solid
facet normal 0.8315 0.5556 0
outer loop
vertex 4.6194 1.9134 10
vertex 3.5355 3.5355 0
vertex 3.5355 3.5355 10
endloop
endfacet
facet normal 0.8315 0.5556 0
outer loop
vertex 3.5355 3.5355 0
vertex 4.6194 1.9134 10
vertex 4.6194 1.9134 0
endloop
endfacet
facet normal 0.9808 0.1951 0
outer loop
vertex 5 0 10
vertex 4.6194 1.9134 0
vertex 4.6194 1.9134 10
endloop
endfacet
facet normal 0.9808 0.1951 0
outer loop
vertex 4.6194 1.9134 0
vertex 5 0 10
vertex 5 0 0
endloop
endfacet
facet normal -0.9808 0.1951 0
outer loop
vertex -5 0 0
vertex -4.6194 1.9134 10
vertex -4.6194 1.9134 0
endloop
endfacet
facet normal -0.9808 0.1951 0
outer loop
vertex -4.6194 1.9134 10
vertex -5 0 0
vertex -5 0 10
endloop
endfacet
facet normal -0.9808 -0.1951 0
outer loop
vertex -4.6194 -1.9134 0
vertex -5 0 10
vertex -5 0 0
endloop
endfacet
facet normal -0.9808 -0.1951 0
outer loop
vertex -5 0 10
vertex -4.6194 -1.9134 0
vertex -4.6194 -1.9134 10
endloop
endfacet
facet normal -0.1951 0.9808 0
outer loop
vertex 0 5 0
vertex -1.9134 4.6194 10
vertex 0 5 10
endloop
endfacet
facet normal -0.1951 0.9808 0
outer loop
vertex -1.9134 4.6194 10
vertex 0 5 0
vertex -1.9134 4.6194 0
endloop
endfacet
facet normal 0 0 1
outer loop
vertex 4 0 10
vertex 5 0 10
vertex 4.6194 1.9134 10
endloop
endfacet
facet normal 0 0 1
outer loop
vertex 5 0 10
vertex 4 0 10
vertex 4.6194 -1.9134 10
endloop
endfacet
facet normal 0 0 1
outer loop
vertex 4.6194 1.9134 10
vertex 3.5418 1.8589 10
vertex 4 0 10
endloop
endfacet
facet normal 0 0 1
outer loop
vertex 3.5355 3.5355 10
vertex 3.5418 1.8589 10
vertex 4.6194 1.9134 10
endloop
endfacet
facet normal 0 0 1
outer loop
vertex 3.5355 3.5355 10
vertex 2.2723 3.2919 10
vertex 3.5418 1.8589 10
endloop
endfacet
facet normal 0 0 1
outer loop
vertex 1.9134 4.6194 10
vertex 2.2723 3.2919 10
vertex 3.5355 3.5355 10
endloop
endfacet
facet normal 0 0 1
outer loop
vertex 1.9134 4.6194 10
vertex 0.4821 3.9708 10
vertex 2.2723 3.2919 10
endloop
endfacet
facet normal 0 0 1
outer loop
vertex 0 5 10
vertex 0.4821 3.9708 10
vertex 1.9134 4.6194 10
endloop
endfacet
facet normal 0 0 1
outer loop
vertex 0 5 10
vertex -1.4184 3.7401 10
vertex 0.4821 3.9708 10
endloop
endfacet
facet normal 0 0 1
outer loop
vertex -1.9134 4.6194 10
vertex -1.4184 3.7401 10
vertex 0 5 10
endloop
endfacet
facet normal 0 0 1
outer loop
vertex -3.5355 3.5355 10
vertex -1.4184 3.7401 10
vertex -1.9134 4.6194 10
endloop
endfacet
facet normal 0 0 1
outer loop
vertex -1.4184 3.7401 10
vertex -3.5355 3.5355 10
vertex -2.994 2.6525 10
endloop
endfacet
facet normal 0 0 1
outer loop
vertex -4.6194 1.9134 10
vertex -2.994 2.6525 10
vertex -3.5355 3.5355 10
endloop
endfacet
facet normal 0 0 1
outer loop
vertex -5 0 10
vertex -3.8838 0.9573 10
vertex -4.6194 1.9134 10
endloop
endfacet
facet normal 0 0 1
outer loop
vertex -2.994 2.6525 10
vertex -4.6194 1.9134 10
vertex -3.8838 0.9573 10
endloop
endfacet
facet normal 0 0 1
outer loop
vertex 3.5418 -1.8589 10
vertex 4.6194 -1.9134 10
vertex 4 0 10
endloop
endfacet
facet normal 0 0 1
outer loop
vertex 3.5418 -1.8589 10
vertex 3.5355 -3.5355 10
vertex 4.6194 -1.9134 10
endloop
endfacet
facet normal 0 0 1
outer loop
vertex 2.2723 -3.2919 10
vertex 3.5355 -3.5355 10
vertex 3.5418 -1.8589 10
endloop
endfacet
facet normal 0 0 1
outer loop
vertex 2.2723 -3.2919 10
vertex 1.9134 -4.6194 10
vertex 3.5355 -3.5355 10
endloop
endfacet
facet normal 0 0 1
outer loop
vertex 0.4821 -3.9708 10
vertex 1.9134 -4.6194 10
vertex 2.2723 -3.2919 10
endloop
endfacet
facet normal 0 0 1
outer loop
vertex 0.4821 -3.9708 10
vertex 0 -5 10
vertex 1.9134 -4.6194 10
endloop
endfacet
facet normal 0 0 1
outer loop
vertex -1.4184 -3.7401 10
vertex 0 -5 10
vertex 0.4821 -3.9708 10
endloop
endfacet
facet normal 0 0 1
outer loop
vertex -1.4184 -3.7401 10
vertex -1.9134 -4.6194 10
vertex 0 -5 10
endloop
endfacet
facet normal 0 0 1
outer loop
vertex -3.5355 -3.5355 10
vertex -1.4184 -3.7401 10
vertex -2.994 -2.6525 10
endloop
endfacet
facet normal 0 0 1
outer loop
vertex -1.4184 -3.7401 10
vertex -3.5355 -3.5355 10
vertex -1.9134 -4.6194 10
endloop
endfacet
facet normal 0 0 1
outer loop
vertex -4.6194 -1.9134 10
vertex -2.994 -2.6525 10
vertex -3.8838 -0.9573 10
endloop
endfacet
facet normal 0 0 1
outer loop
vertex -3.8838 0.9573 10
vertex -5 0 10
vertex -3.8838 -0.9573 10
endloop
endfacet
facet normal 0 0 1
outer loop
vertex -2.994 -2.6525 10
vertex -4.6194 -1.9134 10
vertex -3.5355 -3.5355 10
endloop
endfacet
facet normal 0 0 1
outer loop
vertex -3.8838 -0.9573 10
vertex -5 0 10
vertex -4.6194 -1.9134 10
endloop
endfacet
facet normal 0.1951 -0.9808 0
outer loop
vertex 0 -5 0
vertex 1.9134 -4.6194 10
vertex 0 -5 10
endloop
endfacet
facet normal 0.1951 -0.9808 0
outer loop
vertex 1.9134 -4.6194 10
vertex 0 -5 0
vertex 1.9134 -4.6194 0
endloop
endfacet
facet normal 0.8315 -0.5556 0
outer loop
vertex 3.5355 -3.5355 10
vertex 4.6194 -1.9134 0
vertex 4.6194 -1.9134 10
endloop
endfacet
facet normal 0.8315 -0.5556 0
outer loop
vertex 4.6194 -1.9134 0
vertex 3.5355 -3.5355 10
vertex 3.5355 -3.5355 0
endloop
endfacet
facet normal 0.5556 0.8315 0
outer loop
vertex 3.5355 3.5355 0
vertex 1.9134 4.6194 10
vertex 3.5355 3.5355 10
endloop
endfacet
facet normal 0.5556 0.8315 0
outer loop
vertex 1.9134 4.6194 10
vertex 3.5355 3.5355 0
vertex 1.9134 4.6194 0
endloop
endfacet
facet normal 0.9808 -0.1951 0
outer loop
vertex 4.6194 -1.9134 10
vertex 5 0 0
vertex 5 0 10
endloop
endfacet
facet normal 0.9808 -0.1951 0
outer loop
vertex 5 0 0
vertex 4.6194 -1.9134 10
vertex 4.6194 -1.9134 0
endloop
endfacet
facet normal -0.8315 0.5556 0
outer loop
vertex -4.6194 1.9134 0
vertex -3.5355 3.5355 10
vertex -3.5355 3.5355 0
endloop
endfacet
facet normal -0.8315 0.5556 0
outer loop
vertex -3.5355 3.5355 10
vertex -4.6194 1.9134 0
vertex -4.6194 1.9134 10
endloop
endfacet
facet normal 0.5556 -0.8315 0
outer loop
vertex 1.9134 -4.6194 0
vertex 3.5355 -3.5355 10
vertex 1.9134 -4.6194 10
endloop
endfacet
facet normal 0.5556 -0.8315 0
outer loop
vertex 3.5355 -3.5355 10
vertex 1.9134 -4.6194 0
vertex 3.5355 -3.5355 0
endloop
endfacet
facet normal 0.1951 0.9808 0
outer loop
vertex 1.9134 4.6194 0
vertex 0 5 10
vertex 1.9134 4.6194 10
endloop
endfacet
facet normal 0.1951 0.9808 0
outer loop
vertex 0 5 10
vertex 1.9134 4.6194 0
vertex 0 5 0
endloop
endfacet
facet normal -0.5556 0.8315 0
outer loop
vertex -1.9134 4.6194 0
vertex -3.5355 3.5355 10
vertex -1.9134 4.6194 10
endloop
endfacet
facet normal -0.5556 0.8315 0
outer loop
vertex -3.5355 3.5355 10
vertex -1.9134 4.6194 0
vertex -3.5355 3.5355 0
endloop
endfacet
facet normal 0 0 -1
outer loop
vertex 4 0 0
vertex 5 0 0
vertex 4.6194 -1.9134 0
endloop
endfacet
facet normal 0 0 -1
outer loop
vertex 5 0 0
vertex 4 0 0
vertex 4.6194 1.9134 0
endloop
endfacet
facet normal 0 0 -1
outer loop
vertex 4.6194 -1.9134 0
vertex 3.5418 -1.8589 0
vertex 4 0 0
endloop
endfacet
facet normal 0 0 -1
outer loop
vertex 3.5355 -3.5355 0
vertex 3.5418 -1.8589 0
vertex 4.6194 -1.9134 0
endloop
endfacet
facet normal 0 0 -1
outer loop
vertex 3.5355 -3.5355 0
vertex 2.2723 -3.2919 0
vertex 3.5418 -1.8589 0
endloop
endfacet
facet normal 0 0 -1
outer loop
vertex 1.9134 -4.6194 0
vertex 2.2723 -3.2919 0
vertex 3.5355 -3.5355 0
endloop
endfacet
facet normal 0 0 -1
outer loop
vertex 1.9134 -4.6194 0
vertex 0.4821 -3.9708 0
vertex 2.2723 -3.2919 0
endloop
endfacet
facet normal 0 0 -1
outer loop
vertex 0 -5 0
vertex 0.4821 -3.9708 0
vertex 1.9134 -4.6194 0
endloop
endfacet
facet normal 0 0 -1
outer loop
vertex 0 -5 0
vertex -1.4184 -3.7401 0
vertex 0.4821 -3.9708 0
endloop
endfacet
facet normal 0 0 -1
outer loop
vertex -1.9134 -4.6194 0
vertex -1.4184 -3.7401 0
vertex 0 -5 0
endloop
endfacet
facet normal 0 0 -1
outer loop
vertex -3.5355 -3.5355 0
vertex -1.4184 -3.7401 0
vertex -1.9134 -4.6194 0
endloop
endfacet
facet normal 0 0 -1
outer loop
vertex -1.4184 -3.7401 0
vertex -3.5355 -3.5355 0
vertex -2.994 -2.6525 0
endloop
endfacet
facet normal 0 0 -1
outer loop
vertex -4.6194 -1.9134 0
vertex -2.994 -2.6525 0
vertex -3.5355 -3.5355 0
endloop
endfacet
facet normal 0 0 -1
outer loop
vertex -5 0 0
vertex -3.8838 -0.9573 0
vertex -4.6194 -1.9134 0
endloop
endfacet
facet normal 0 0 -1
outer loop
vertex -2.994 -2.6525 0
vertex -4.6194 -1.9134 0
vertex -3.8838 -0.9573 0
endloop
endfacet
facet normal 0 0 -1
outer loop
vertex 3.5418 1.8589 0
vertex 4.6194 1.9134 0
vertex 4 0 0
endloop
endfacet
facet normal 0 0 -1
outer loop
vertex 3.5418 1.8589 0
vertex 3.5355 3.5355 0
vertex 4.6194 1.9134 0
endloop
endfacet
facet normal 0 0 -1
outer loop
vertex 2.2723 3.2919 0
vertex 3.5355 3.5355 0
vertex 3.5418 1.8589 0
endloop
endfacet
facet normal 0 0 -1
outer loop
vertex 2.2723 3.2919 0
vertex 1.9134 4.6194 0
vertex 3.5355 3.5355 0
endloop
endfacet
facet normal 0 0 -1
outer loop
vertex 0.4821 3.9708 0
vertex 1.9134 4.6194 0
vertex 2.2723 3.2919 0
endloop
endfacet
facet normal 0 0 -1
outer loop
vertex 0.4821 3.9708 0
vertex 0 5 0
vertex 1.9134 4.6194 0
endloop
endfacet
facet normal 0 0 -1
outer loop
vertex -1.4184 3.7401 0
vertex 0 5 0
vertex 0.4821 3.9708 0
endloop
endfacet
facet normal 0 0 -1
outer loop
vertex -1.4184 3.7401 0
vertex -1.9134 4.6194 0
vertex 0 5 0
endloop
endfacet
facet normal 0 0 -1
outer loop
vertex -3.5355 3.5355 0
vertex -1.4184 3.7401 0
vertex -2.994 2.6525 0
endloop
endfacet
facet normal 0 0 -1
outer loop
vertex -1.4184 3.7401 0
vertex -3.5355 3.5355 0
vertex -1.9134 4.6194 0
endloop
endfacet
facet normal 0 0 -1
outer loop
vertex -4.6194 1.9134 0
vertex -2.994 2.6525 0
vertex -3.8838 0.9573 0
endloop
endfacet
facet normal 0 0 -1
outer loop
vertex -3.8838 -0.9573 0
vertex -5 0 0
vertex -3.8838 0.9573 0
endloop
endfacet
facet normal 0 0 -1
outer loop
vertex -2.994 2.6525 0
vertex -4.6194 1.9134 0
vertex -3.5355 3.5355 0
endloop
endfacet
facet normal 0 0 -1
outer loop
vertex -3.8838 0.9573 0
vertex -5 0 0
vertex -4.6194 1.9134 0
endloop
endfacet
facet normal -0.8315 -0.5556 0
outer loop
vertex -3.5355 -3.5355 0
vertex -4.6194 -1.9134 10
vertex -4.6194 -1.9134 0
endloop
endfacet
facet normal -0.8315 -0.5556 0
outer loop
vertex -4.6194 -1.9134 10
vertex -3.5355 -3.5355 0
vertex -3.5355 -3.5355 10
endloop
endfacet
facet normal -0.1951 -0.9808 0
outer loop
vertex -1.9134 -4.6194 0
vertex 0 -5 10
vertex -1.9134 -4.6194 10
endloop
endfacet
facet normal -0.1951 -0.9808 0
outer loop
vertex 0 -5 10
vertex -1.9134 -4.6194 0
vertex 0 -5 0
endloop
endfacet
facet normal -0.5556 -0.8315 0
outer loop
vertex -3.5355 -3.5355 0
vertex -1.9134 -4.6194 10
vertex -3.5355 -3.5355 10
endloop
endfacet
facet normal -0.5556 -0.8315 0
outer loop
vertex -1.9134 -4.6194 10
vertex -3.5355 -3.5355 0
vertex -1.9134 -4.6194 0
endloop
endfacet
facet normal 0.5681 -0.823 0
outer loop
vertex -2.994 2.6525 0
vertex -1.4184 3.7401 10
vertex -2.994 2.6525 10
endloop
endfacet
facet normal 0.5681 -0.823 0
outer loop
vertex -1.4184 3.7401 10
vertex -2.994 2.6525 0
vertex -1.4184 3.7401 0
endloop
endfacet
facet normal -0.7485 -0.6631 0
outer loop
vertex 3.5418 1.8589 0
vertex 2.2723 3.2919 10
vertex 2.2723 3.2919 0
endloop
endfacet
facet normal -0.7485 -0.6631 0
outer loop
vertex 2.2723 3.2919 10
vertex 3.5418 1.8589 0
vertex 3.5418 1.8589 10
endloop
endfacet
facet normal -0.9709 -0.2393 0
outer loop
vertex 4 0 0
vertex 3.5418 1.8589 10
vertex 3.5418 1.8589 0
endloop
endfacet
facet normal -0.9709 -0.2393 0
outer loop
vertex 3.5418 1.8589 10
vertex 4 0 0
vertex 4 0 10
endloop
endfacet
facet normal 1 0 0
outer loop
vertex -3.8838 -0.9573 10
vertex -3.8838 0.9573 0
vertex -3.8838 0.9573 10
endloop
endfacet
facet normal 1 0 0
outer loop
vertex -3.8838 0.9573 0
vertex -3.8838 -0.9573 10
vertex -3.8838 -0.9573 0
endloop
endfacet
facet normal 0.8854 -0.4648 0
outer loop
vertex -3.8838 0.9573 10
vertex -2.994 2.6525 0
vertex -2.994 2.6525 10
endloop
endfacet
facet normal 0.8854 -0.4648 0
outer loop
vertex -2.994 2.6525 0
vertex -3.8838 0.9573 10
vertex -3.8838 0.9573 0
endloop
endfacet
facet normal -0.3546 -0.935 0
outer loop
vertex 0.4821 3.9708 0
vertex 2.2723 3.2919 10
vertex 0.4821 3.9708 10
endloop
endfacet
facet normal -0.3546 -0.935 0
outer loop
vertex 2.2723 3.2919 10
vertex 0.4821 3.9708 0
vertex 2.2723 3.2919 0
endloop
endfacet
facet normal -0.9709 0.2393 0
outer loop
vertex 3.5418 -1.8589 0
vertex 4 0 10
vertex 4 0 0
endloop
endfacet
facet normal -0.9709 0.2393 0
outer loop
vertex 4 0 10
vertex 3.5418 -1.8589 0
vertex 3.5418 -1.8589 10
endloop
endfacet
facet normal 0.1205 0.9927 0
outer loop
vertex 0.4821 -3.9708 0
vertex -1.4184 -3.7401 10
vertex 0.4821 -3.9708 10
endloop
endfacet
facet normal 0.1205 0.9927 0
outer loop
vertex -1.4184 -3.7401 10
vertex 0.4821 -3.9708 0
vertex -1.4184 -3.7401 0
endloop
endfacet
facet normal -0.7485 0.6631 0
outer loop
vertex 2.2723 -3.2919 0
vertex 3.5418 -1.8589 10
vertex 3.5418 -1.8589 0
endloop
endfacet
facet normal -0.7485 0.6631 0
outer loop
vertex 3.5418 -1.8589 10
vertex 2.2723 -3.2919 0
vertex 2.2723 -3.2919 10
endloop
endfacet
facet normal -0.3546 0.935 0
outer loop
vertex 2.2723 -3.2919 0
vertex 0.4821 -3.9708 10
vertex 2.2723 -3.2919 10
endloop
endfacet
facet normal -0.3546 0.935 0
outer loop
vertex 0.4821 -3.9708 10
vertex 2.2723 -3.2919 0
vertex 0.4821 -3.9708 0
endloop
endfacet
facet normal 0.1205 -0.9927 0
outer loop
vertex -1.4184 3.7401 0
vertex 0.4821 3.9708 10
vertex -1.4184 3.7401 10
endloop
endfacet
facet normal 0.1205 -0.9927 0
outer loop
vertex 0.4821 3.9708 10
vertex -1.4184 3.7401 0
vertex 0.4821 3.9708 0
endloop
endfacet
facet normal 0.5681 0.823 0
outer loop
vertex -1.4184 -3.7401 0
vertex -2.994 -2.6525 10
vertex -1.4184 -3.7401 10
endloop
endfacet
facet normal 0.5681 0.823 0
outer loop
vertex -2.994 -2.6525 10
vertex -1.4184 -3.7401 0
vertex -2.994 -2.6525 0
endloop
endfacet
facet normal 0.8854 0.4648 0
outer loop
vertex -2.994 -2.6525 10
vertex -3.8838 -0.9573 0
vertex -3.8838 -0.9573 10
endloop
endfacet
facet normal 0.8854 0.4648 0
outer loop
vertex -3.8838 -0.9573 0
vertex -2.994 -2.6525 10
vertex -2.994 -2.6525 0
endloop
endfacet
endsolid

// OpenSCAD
module ring(r1, r2, h) {
    difference() {
        cylinder(r = r1, h = h);
        translate([ 0, 0, -1 ]) cylinder(r = r2, h = h+2);
    }
}

ring(5, 4, 10);
